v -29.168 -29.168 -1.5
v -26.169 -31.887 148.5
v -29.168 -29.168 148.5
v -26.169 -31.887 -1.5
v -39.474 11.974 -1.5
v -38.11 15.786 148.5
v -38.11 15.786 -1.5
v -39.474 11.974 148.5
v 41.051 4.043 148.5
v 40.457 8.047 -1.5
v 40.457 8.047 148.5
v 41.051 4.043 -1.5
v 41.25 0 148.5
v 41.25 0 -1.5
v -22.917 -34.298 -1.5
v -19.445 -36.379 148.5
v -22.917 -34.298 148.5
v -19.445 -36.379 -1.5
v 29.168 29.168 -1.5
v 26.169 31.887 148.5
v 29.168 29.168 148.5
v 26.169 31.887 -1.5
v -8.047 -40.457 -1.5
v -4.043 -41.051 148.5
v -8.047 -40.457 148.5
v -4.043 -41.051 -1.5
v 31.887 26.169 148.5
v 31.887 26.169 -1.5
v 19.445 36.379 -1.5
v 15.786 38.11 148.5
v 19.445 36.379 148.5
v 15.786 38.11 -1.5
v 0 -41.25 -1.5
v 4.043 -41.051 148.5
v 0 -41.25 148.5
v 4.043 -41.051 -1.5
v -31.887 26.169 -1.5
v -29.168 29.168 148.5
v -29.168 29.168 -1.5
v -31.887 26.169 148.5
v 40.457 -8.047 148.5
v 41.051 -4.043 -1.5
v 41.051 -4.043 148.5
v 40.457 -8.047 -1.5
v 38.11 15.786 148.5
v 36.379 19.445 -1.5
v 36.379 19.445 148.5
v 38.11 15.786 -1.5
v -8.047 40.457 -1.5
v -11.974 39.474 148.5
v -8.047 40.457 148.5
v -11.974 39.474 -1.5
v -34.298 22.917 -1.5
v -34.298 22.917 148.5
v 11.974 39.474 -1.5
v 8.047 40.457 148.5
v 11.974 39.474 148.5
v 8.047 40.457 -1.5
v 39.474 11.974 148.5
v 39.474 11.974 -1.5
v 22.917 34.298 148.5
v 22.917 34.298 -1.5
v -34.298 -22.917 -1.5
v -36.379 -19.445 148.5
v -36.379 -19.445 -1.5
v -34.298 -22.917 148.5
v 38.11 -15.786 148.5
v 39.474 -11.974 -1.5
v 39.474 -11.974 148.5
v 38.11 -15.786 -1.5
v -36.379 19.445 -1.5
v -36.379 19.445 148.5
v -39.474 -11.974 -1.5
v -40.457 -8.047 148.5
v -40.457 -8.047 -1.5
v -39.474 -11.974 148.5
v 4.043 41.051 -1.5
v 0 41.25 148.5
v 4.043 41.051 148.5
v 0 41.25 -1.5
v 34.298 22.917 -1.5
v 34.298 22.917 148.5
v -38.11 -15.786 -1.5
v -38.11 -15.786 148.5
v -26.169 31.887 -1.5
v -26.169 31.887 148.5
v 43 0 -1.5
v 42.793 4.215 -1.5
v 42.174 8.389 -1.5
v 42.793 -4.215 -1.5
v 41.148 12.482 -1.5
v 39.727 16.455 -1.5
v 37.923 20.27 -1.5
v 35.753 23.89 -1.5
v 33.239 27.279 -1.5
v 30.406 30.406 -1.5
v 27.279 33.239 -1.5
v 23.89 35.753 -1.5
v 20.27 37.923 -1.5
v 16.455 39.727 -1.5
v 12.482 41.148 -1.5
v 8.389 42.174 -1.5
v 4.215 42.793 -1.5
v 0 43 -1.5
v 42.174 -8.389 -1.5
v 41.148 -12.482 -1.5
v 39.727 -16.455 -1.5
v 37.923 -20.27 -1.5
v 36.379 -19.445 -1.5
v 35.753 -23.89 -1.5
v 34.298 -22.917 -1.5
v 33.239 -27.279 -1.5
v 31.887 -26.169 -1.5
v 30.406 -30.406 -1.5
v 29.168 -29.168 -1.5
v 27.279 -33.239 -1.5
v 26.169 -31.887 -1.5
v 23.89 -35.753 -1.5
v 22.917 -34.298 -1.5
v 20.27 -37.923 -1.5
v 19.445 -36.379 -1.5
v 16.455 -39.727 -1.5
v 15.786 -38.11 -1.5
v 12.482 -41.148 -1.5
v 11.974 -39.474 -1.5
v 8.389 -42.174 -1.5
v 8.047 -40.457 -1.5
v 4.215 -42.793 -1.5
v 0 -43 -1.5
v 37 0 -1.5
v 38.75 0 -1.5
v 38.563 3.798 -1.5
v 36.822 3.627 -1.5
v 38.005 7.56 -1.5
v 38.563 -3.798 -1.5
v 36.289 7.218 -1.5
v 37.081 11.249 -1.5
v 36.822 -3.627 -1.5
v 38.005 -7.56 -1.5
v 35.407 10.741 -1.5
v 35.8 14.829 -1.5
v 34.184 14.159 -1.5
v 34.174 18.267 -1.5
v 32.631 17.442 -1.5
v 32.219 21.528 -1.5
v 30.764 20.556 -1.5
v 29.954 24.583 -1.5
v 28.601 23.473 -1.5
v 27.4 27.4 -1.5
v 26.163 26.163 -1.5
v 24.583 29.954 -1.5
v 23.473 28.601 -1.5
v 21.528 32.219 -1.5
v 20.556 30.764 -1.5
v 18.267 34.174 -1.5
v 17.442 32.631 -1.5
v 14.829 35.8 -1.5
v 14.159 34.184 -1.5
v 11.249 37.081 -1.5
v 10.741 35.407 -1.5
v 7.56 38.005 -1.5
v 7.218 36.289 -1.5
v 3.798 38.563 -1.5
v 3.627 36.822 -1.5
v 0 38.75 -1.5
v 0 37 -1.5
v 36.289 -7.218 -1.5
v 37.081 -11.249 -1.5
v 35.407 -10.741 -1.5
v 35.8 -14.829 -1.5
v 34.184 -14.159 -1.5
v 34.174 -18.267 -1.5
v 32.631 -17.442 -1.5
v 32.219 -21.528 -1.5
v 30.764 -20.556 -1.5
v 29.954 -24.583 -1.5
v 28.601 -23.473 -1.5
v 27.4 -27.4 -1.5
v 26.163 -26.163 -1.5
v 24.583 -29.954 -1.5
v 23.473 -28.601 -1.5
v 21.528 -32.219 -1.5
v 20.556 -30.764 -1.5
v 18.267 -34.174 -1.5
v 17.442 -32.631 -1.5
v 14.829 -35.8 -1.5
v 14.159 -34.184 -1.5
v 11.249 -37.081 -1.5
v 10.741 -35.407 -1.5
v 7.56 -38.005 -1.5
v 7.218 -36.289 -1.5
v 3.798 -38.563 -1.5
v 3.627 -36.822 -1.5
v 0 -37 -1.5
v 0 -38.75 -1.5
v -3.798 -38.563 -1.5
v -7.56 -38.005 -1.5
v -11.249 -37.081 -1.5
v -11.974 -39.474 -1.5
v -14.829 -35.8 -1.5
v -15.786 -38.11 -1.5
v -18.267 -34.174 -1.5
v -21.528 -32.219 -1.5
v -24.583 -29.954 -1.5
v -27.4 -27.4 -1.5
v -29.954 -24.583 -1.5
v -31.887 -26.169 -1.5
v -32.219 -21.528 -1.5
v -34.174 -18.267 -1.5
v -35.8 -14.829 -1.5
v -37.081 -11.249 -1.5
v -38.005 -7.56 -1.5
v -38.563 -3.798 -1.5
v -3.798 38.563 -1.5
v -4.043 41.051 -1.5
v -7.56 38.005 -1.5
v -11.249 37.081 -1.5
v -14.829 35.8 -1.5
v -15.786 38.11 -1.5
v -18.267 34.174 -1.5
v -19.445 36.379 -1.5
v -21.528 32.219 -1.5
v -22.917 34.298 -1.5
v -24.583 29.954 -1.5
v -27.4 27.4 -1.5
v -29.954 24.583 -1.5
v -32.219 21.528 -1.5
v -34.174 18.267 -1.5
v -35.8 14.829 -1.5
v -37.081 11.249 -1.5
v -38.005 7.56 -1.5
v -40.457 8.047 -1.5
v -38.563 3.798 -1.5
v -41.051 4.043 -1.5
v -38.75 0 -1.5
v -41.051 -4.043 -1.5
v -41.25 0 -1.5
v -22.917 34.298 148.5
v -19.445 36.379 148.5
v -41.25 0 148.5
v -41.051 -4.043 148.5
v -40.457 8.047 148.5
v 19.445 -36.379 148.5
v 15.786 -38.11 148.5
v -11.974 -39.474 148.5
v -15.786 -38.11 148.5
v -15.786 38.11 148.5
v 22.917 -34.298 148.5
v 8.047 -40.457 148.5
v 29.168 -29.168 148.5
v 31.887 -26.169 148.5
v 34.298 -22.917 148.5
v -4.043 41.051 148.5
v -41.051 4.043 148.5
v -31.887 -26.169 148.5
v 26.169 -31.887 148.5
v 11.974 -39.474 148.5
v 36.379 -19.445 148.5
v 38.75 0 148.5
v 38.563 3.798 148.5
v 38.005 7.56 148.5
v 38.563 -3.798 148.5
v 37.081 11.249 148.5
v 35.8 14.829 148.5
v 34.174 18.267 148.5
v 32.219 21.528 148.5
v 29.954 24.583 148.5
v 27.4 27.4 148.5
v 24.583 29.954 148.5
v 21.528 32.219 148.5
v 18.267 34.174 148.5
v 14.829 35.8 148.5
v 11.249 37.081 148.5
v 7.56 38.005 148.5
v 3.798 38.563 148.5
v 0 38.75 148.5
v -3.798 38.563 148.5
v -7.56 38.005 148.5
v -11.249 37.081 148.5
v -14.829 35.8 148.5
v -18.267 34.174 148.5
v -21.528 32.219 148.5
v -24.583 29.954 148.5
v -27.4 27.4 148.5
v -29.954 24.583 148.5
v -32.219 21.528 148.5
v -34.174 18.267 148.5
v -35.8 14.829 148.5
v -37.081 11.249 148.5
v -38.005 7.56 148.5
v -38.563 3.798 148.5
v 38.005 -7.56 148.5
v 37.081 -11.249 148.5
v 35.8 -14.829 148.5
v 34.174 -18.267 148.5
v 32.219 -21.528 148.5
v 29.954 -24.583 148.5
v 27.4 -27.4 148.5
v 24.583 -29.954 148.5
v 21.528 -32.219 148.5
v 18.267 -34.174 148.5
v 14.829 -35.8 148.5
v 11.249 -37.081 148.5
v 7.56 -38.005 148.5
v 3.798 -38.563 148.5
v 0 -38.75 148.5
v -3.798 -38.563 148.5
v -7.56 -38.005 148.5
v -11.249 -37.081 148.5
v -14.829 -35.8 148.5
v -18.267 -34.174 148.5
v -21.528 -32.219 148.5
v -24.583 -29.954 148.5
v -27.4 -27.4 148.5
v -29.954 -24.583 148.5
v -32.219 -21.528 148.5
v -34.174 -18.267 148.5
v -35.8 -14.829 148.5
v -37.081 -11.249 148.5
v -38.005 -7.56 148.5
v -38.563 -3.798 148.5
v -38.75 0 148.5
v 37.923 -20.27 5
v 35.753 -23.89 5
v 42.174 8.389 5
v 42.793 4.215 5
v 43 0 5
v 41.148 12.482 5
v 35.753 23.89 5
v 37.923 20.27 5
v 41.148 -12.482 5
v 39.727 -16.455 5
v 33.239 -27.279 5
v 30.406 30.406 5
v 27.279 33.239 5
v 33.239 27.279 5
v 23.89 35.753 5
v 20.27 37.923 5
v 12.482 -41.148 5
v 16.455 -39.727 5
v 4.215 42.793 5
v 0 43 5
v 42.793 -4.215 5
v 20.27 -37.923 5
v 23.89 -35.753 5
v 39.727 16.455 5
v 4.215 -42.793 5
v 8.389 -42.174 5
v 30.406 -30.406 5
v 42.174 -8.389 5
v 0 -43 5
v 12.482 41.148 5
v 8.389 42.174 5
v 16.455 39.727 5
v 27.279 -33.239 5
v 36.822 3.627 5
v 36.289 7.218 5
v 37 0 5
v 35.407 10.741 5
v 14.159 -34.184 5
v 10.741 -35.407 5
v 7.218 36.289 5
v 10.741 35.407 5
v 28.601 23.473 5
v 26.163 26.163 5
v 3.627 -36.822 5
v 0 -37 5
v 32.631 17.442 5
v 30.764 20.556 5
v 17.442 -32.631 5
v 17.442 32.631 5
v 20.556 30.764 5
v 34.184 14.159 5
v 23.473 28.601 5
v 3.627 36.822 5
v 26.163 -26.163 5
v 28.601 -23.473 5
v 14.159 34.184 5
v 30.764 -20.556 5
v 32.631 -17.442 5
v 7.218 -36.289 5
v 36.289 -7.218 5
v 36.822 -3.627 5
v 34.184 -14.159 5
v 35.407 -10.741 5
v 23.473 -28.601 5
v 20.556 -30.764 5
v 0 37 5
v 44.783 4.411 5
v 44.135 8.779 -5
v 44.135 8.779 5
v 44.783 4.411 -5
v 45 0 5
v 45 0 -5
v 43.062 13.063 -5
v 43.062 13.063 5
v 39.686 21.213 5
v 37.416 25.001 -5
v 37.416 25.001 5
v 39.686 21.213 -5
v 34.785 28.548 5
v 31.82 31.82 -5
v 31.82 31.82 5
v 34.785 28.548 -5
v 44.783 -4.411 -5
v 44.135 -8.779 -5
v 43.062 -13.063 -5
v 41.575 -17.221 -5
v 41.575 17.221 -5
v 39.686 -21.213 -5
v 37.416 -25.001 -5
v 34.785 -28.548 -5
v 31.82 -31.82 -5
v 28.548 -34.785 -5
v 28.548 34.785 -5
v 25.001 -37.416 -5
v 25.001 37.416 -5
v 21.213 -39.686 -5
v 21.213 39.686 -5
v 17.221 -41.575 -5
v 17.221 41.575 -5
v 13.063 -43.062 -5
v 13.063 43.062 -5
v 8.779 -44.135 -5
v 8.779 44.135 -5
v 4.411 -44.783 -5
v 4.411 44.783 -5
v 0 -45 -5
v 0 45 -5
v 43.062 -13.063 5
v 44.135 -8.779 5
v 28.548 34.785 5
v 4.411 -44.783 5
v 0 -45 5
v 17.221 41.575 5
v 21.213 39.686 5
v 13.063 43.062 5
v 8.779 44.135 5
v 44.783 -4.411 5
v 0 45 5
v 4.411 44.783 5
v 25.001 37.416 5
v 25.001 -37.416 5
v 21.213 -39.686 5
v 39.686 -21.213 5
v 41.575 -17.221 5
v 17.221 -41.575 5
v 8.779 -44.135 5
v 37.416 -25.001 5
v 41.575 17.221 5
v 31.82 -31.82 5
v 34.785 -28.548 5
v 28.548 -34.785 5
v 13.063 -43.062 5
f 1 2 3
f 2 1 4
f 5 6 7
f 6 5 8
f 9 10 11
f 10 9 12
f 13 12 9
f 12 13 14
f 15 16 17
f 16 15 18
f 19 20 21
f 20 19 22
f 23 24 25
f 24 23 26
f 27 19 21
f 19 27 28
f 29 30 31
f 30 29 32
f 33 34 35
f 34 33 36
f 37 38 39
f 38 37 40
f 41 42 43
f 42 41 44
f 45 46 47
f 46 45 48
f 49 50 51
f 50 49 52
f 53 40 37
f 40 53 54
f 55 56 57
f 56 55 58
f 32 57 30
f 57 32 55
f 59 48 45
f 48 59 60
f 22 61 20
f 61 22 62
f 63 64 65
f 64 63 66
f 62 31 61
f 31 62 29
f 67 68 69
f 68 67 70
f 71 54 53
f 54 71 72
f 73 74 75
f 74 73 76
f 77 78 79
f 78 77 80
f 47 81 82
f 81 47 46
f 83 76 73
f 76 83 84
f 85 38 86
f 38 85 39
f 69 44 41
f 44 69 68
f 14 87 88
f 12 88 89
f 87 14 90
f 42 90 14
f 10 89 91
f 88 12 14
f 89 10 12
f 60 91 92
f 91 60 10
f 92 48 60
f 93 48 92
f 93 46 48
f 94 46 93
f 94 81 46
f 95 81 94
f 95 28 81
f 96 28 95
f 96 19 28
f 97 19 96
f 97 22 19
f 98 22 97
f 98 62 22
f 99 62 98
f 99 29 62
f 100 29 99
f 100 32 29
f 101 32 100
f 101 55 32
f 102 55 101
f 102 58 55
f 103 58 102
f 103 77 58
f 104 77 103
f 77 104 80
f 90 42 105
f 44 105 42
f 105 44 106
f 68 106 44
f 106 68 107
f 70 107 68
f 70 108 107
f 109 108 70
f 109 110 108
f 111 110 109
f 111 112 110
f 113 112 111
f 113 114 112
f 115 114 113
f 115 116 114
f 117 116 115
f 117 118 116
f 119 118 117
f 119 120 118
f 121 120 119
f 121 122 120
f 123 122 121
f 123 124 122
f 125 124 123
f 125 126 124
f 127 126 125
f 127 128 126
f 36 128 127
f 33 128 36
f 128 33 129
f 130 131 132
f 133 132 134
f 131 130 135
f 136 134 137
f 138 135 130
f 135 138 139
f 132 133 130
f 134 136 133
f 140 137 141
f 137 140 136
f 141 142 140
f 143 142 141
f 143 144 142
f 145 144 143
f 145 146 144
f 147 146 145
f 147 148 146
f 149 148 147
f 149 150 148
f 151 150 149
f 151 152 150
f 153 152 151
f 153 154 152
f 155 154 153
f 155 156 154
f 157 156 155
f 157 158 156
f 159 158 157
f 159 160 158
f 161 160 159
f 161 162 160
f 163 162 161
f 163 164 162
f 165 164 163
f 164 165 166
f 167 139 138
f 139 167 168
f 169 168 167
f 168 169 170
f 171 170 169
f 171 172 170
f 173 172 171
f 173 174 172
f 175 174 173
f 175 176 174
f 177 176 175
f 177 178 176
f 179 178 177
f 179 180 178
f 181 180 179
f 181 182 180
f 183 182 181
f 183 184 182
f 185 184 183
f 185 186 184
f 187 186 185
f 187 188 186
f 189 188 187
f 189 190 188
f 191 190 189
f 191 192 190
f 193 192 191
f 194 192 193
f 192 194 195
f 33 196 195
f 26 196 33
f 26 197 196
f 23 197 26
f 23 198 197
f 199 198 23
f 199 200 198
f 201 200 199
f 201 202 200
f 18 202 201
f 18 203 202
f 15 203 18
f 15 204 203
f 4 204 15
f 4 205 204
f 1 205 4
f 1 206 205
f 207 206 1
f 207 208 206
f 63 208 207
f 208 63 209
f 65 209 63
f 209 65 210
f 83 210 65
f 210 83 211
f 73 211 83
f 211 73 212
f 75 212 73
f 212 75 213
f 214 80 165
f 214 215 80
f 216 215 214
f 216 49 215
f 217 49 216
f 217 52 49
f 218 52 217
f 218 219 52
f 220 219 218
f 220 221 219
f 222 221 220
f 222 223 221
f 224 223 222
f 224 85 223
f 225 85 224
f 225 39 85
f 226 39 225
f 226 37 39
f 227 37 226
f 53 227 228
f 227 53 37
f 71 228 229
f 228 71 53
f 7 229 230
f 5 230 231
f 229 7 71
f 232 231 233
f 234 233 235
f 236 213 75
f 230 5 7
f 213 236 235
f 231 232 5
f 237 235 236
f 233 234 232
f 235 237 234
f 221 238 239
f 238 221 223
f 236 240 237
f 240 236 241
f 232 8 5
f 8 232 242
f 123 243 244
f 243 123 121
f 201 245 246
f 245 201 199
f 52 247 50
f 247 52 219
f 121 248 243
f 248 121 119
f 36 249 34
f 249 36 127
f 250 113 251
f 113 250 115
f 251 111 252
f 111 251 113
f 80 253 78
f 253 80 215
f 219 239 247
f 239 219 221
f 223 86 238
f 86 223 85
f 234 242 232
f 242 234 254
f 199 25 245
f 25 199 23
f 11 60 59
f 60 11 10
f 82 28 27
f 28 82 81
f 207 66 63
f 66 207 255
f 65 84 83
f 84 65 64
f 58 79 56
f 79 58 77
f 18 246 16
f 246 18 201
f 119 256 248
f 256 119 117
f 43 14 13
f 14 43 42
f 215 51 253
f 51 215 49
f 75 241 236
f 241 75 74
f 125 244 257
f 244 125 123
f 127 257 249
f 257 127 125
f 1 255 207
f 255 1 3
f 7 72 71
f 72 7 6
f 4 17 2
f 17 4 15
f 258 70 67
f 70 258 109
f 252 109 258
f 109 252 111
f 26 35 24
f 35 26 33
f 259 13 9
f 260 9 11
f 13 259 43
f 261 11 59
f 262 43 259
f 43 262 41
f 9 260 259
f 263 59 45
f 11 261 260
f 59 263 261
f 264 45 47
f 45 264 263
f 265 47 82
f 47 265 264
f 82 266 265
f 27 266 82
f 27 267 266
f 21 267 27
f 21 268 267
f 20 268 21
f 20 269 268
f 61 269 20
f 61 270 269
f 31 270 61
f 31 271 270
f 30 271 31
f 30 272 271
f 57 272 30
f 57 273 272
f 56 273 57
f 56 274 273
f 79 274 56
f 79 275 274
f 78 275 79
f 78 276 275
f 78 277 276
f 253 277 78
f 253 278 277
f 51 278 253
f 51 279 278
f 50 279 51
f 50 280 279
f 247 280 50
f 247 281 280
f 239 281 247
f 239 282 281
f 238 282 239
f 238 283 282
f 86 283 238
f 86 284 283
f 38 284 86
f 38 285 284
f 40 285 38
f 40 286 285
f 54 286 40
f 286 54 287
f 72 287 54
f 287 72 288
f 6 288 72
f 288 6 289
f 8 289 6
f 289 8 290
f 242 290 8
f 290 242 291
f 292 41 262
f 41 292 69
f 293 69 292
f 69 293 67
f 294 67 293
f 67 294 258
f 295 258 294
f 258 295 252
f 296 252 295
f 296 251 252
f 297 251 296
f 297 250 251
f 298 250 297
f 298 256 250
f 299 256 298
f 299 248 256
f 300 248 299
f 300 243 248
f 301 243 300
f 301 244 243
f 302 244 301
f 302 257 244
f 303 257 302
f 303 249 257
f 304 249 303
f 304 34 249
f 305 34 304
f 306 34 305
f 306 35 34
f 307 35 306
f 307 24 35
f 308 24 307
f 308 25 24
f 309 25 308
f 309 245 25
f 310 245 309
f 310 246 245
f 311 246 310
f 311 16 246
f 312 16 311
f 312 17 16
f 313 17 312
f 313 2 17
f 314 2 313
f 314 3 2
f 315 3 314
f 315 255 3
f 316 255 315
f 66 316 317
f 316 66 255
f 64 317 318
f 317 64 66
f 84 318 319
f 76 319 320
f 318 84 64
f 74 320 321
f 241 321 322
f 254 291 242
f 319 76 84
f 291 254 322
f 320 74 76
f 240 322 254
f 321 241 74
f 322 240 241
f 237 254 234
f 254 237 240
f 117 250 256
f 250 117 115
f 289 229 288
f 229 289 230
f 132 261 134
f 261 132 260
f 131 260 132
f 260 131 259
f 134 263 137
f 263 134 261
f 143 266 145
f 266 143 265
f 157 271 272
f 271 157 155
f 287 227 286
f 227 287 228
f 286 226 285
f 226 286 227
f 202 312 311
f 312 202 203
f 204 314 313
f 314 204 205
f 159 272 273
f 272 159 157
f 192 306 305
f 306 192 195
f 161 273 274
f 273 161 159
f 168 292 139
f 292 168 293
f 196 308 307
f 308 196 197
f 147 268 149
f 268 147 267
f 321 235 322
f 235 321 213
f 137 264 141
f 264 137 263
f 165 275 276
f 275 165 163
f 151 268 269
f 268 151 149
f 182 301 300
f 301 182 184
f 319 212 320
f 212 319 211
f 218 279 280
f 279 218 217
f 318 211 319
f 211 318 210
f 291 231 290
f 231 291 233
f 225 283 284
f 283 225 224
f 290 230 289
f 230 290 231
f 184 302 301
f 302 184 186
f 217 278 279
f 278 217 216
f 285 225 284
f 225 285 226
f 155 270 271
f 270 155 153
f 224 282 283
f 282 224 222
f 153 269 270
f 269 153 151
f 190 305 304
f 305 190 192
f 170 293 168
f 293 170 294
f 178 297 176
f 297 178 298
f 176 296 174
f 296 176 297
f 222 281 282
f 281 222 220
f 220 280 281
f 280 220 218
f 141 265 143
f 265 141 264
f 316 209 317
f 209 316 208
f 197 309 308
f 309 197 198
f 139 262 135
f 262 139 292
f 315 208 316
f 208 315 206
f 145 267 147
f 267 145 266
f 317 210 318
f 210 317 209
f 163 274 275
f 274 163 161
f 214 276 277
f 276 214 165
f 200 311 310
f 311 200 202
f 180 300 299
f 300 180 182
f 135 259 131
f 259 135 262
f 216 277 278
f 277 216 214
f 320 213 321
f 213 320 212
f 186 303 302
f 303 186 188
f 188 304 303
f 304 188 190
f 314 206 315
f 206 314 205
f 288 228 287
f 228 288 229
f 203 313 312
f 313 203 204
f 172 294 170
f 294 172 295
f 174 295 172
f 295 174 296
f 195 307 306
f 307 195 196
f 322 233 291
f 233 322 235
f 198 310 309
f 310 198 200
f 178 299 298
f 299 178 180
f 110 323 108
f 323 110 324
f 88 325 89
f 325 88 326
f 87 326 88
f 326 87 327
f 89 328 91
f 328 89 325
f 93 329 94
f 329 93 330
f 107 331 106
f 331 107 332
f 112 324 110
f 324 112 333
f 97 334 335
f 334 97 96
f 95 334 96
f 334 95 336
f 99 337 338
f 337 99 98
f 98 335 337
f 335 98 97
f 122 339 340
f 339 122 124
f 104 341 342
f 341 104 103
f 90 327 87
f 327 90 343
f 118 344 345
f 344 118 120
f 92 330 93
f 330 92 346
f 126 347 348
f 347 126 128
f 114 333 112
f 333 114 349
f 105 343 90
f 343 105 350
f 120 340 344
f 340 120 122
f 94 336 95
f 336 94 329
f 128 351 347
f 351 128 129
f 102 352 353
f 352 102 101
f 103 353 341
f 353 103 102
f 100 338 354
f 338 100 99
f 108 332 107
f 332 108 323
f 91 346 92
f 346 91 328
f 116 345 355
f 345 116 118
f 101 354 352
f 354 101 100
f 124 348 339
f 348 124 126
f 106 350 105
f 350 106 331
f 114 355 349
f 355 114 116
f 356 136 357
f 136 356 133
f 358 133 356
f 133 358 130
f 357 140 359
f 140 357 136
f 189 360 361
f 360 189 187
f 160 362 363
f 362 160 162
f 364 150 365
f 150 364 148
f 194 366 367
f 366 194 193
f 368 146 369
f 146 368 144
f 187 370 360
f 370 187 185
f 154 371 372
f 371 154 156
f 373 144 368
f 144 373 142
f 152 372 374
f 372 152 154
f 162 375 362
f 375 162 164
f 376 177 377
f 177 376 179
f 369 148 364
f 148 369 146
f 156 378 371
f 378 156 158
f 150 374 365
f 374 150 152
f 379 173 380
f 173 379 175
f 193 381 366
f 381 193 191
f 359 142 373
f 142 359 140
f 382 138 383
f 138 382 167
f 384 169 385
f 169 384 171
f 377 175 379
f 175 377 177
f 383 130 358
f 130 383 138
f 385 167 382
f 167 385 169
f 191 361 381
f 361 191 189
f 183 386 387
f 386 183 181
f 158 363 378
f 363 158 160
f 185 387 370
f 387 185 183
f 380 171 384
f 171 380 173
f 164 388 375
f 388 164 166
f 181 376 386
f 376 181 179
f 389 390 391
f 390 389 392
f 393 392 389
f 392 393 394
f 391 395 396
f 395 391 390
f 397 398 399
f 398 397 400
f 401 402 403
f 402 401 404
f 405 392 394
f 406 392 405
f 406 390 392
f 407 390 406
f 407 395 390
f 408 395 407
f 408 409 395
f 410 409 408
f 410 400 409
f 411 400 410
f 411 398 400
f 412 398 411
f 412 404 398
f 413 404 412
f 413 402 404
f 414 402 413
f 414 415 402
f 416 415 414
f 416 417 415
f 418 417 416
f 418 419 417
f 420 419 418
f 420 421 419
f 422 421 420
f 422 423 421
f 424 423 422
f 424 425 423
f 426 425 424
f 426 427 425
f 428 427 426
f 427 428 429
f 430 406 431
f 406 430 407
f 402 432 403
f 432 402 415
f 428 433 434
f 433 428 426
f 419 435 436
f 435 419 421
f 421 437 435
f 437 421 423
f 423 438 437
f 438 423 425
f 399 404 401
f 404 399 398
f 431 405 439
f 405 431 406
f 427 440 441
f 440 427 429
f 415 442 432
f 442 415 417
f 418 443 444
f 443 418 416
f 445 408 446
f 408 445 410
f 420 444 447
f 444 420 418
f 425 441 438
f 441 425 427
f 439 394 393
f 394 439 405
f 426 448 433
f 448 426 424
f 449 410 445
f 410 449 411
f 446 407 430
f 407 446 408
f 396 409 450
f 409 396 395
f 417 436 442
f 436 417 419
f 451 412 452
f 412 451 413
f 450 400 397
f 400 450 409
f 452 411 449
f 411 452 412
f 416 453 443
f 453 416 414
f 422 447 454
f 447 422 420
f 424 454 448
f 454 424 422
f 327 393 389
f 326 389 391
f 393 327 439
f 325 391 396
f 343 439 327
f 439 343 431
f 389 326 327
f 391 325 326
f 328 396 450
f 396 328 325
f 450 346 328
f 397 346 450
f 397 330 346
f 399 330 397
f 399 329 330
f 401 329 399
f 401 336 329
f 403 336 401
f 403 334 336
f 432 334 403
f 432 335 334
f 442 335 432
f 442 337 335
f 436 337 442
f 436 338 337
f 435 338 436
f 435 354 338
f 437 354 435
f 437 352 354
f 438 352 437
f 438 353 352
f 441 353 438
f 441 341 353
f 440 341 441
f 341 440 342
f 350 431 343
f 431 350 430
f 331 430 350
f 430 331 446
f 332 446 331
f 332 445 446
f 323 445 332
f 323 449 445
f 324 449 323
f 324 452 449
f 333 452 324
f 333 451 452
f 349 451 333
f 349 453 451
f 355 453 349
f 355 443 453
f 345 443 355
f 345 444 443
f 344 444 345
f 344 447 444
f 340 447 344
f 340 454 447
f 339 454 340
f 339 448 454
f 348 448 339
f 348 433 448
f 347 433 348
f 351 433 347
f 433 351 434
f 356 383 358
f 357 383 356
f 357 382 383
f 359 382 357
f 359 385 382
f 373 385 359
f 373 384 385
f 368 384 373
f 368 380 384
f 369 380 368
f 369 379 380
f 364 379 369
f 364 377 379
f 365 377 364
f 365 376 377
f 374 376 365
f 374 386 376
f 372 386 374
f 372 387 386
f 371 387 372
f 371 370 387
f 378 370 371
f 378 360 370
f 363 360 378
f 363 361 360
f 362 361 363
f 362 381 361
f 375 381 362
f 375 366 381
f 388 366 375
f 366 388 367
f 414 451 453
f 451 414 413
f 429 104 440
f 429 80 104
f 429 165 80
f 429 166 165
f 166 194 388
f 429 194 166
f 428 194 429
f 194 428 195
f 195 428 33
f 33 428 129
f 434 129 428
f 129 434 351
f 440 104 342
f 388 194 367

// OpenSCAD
// file: speaker_bottom.scad
include <speaker_walls.scad>


module bottom(){
    difference(){
        cylinder(d=90,h=10,center=true);
        translate([0,0,150/2+10/4-4])
        walls(thickness=12);
        }
    }
// file: speaker_walls.scad
//Bluetooth-speaker
$fn=64;

//walls(thickness=14);

module walls(thickness){
    difference(){
        cylinder(d=80+thickness/2,h=150,center=true);
        color("red")
        cylinder(d=80-thickness/2,h=160,center=true);
      }
}
// main file
include <speaker_walls.scad>
include <speaker_bottom.scad>
$fn = 64;

translate([0,0,150/2+10/4-4])
walls(thickness=5);

difference(){
    bottom();
    translate([-90/2,0,1])
    cube(90,center=true);
    }
